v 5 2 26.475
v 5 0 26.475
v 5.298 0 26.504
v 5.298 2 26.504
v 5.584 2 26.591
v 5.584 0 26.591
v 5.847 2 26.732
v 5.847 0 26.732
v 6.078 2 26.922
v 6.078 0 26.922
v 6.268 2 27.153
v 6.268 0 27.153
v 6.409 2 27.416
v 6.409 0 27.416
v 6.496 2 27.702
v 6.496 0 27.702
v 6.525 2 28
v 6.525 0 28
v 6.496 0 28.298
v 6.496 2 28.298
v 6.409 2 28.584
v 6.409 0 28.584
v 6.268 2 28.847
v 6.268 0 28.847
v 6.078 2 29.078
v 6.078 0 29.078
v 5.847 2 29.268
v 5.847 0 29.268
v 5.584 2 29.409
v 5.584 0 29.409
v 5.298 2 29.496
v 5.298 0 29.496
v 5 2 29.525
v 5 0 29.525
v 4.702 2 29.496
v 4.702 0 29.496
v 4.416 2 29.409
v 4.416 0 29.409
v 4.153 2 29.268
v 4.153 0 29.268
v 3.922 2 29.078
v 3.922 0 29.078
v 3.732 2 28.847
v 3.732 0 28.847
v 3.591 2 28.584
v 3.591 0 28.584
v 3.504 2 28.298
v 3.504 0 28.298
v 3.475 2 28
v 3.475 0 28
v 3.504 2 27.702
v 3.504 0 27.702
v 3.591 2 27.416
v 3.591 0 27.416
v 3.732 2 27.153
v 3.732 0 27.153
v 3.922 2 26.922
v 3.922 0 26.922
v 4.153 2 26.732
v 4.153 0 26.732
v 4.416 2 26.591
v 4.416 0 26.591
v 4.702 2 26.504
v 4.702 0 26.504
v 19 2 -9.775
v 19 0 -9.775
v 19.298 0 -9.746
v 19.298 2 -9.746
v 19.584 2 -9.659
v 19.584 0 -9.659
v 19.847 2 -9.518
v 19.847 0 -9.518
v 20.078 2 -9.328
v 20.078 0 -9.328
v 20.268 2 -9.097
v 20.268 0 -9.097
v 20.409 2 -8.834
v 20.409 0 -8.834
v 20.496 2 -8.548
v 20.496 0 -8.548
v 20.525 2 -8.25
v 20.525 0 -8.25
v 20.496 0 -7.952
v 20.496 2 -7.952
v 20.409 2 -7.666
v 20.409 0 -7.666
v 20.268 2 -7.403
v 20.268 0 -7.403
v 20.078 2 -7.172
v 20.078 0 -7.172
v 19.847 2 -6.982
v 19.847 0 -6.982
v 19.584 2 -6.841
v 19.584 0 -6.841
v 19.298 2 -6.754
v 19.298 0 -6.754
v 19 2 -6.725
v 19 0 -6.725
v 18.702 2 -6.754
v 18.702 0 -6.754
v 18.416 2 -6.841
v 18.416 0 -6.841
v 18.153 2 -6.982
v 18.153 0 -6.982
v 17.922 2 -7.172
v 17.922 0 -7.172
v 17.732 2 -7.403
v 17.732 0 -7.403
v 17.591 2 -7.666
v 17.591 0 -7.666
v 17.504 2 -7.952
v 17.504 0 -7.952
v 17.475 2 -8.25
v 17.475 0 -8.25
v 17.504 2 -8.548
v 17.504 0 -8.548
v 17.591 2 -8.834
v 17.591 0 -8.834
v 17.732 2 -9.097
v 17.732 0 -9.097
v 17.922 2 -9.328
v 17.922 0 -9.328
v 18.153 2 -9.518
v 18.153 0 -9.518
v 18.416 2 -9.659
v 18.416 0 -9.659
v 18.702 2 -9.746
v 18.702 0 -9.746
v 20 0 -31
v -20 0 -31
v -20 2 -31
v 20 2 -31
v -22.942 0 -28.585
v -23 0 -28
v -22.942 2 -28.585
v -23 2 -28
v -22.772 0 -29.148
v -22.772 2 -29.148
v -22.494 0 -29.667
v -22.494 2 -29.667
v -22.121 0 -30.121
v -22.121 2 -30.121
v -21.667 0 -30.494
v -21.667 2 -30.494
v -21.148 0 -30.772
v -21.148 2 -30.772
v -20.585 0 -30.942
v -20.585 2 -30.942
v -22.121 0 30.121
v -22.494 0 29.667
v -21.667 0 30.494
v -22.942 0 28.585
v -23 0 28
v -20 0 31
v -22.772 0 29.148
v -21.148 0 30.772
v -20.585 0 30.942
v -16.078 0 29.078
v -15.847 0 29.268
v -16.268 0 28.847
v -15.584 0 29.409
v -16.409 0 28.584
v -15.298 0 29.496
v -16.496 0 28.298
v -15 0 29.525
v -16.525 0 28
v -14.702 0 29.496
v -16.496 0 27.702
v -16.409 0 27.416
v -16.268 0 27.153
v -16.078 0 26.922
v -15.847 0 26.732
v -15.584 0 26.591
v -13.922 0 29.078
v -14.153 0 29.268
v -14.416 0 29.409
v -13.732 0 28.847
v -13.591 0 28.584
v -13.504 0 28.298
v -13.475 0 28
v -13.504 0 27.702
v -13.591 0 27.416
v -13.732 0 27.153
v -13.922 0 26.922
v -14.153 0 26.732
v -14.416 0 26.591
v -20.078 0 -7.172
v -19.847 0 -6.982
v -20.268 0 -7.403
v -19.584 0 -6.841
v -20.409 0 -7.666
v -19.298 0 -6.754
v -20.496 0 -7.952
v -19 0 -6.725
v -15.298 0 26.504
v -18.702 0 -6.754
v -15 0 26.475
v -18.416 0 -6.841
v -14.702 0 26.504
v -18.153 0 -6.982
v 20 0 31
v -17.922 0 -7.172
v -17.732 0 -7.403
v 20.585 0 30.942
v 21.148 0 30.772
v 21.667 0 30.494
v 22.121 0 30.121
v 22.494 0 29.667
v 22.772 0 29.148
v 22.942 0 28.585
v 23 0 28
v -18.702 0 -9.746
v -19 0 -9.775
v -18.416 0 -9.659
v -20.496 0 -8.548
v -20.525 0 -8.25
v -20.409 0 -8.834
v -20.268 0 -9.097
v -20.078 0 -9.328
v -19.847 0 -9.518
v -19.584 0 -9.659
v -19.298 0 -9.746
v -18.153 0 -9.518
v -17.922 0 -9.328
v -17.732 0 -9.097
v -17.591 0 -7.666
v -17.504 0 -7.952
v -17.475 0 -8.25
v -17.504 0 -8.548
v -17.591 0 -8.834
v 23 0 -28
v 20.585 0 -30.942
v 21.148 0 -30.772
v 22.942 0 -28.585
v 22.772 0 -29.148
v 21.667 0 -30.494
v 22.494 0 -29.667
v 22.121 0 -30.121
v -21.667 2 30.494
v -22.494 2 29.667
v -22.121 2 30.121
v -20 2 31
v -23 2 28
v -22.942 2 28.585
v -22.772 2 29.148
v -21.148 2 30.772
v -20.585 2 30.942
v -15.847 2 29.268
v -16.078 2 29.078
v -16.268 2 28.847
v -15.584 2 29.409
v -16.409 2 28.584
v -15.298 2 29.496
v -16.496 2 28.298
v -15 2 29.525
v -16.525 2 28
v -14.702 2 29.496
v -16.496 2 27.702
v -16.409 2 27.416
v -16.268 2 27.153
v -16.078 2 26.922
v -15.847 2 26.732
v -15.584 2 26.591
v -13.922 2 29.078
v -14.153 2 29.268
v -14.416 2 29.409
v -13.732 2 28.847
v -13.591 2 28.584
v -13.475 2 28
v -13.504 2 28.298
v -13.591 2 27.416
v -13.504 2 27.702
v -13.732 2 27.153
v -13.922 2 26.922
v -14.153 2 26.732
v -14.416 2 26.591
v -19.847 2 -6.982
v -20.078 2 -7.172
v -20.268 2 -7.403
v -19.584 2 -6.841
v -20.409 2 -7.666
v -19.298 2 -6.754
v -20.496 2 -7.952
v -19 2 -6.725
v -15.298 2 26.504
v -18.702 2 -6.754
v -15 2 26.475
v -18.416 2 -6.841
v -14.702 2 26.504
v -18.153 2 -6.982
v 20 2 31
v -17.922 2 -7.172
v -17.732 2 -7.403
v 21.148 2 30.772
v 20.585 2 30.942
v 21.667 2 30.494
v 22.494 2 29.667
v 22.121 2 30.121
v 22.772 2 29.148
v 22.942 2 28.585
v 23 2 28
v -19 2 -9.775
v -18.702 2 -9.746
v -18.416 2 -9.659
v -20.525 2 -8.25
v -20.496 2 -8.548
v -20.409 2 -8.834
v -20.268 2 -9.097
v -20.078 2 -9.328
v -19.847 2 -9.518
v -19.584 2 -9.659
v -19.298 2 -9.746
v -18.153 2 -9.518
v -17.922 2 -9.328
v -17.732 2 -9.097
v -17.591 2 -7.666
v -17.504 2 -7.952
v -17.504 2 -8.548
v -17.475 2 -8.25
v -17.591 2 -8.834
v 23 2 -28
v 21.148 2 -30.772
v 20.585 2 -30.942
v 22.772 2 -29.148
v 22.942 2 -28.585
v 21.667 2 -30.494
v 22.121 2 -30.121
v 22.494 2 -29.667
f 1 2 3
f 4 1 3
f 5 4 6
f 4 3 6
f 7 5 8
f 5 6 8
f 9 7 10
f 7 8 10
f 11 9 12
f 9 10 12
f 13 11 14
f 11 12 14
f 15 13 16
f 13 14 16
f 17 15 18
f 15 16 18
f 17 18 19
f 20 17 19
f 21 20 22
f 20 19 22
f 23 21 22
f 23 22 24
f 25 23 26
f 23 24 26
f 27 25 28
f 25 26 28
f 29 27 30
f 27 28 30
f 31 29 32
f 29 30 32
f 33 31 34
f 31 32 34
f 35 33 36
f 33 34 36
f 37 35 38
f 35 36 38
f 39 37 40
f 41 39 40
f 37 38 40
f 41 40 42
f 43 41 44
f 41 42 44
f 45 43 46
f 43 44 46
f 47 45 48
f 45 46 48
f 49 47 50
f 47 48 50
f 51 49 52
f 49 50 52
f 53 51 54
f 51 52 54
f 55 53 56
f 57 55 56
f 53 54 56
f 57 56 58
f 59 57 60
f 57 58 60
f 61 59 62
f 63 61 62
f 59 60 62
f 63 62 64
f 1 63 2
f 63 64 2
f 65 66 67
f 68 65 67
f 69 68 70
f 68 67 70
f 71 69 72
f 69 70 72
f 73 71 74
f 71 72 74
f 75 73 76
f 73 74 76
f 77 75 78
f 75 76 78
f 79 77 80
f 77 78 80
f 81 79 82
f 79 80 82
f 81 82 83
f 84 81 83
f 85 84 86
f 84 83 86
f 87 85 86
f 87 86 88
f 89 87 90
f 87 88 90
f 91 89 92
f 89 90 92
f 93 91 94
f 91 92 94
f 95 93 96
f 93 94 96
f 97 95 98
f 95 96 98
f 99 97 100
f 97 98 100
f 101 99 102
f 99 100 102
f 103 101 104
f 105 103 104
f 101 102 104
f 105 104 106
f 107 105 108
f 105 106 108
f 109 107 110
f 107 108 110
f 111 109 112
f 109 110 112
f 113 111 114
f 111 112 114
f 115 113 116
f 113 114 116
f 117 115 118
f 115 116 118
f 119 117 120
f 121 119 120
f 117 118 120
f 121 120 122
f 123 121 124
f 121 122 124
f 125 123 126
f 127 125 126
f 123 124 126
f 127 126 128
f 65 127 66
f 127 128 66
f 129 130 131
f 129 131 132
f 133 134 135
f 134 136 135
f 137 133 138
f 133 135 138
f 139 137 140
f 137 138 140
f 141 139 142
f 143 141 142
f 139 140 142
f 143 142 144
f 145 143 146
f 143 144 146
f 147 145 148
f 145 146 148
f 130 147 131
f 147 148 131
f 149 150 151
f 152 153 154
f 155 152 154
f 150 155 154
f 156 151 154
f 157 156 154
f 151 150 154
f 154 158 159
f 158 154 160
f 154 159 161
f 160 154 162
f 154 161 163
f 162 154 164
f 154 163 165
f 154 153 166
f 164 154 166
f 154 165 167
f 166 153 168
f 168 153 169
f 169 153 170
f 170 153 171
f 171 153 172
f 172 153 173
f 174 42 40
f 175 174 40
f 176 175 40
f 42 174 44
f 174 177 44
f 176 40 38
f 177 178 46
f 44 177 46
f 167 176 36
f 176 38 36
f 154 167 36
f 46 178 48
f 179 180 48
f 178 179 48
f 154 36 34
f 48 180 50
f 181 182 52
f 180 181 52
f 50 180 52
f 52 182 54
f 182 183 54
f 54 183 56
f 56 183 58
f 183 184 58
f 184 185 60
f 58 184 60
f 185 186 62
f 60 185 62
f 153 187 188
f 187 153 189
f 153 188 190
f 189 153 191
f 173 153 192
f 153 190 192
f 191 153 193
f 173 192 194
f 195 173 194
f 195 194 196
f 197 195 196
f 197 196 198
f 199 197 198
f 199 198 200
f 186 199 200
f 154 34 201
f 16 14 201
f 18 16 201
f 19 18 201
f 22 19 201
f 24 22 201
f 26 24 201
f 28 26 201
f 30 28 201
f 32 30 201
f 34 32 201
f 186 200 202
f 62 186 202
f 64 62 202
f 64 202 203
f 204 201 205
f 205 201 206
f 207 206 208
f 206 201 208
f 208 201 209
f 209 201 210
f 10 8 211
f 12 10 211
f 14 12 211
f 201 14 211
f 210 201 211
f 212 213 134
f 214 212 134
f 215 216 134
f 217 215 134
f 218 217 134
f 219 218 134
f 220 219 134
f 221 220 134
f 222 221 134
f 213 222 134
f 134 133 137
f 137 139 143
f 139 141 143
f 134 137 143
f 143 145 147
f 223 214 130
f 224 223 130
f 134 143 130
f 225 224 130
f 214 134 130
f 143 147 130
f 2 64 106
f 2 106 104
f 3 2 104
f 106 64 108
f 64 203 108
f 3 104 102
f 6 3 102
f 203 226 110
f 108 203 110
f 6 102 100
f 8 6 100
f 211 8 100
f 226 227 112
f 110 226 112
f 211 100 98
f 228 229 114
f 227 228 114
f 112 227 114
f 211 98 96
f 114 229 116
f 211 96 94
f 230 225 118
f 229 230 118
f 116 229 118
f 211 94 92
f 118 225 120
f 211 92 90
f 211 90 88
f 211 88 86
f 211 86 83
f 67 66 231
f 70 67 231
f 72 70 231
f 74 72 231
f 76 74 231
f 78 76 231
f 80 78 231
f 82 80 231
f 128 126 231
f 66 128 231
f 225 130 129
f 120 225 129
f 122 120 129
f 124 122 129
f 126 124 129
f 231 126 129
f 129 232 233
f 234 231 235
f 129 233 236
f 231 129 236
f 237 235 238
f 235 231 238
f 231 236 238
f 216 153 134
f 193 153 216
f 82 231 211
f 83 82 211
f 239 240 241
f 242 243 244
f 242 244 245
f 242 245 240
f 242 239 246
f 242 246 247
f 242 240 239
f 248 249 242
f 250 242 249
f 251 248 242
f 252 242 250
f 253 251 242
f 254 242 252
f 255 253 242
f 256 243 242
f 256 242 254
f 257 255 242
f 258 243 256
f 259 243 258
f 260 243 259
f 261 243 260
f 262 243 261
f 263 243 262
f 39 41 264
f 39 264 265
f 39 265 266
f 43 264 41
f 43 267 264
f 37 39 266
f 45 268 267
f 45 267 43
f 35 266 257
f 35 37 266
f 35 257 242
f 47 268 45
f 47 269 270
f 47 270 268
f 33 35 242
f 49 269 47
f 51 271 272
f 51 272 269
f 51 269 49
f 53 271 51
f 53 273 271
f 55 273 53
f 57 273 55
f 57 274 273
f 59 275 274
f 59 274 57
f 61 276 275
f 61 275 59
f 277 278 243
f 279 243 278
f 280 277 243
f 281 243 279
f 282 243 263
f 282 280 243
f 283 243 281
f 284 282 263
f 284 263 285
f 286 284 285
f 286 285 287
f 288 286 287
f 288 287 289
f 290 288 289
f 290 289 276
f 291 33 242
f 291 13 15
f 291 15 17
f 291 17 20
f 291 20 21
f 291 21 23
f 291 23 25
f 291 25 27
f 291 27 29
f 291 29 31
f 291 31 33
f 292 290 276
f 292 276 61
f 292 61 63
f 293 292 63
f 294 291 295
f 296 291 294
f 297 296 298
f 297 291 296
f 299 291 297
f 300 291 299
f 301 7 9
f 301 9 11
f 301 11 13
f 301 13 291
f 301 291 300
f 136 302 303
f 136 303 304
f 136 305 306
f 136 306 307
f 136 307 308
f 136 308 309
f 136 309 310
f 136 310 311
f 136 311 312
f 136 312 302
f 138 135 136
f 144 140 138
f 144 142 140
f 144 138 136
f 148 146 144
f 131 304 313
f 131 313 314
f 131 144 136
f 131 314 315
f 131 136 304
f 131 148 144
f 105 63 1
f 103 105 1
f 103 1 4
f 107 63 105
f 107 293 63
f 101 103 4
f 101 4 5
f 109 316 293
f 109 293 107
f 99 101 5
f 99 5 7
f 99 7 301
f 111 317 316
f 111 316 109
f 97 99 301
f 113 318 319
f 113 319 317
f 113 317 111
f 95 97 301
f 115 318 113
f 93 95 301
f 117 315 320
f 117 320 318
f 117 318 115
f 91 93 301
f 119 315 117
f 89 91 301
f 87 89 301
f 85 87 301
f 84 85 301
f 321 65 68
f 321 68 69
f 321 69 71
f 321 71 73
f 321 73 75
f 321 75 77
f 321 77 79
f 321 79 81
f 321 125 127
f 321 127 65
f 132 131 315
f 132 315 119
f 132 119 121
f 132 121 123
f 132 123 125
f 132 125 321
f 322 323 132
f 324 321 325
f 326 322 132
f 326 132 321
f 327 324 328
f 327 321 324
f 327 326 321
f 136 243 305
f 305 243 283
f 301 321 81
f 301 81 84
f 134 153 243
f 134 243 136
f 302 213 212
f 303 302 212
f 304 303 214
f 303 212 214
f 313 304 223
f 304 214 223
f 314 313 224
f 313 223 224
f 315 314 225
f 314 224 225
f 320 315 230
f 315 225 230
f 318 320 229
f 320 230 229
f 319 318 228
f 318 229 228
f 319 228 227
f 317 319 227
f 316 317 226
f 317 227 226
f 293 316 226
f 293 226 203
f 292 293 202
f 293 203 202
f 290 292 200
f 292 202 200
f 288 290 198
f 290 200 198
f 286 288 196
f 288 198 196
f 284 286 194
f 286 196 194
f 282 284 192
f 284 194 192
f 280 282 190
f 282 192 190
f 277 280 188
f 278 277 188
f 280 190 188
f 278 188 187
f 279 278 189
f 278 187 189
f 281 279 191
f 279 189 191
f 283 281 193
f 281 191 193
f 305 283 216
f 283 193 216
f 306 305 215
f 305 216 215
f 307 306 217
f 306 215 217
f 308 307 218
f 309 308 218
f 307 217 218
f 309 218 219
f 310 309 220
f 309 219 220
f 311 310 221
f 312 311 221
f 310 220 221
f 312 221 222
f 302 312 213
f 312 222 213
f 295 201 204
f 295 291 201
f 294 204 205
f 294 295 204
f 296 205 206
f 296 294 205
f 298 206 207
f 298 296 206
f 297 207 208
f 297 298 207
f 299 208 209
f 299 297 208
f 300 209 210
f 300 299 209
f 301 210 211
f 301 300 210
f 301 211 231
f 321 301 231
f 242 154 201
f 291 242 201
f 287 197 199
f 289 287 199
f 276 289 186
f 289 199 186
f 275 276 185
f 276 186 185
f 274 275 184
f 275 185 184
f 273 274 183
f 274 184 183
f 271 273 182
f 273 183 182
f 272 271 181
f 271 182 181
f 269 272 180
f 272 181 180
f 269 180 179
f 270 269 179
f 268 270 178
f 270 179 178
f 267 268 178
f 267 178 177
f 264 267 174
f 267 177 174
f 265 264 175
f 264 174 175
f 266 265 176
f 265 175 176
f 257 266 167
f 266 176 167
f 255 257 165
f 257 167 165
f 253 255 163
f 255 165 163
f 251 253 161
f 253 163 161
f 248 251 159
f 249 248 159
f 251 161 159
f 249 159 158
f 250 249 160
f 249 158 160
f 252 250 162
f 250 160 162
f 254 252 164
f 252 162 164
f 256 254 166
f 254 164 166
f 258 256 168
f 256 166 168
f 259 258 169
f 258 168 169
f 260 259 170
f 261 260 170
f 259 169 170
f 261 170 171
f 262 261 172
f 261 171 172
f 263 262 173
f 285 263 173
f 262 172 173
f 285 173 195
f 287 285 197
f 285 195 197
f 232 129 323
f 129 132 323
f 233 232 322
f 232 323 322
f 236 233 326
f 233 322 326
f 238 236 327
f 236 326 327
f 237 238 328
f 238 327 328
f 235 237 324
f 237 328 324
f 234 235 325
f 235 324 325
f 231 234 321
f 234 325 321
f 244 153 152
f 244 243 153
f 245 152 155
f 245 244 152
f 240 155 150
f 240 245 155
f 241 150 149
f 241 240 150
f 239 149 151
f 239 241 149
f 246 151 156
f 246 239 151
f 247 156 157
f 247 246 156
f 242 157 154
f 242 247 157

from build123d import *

# Parameters (mm, degrees)
SKETCH_1_W          = 46
SKETCH_1_H          = 62
EXTRUDE_1_DEPTH     = 2
SKETCH_2_R          = 1.525
CUT_EXTRUDE_1_DEPTH = 2
SKETCH_3_R          = 1.525
CUT_EXTRUDE_2_DEPTH = 2
FILLET_1_R          = 3


with BuildPart() as part:
    # 草图1 → 凸台-拉伸1 (new body)
    with BuildSketch(Plane(origin=(0, 0, 0), x_dir=(1, 0, 0), z_dir=(0, 1, 0))):
        Rectangle(SKETCH_1_W, SKETCH_1_H)
    extrude(amount=EXTRUDE_1_DEPTH)

    # 草图2 → 切除-拉伸1 (cut)
    with BuildSketch(Plane.XZ):
        with Locations(Location((19, -8.25, 0), (0, 0, 270))):
            Circle(SKETCH_2_R)
        with Locations(Location((-19, -8.25, 0), (0, 0, 270))):
            Circle(SKETCH_2_R)
    extrude(amount=-CUT_EXTRUDE_1_DEPTH, mode=Mode.SUBTRACT)

    # 草图3 → 切除-拉伸2 (cut)
    with BuildSketch(Plane.XZ):
        with Locations(Location((5, 28, 0), (0, 0, 270))):
            Circle(SKETCH_3_R)
        with Locations(Location((-15, 28, 0), (0, 0, 270))):
            Circle(SKETCH_3_R)
    extrude(amount=-CUT_EXTRUDE_2_DEPTH, mode=Mode.SUBTRACT)

    # 圆角1
    fillet_1_edges = [part.edges().sort_by_distance(p)[0] for p in [
        (23, 1, 31),
        (-23, 1, 31),
        (-23, 1, -31),
        (23, 1, -31),
    ]]
    fillet(fillet_1_edges, radius=FILLET_1_R)


solid = part.part
